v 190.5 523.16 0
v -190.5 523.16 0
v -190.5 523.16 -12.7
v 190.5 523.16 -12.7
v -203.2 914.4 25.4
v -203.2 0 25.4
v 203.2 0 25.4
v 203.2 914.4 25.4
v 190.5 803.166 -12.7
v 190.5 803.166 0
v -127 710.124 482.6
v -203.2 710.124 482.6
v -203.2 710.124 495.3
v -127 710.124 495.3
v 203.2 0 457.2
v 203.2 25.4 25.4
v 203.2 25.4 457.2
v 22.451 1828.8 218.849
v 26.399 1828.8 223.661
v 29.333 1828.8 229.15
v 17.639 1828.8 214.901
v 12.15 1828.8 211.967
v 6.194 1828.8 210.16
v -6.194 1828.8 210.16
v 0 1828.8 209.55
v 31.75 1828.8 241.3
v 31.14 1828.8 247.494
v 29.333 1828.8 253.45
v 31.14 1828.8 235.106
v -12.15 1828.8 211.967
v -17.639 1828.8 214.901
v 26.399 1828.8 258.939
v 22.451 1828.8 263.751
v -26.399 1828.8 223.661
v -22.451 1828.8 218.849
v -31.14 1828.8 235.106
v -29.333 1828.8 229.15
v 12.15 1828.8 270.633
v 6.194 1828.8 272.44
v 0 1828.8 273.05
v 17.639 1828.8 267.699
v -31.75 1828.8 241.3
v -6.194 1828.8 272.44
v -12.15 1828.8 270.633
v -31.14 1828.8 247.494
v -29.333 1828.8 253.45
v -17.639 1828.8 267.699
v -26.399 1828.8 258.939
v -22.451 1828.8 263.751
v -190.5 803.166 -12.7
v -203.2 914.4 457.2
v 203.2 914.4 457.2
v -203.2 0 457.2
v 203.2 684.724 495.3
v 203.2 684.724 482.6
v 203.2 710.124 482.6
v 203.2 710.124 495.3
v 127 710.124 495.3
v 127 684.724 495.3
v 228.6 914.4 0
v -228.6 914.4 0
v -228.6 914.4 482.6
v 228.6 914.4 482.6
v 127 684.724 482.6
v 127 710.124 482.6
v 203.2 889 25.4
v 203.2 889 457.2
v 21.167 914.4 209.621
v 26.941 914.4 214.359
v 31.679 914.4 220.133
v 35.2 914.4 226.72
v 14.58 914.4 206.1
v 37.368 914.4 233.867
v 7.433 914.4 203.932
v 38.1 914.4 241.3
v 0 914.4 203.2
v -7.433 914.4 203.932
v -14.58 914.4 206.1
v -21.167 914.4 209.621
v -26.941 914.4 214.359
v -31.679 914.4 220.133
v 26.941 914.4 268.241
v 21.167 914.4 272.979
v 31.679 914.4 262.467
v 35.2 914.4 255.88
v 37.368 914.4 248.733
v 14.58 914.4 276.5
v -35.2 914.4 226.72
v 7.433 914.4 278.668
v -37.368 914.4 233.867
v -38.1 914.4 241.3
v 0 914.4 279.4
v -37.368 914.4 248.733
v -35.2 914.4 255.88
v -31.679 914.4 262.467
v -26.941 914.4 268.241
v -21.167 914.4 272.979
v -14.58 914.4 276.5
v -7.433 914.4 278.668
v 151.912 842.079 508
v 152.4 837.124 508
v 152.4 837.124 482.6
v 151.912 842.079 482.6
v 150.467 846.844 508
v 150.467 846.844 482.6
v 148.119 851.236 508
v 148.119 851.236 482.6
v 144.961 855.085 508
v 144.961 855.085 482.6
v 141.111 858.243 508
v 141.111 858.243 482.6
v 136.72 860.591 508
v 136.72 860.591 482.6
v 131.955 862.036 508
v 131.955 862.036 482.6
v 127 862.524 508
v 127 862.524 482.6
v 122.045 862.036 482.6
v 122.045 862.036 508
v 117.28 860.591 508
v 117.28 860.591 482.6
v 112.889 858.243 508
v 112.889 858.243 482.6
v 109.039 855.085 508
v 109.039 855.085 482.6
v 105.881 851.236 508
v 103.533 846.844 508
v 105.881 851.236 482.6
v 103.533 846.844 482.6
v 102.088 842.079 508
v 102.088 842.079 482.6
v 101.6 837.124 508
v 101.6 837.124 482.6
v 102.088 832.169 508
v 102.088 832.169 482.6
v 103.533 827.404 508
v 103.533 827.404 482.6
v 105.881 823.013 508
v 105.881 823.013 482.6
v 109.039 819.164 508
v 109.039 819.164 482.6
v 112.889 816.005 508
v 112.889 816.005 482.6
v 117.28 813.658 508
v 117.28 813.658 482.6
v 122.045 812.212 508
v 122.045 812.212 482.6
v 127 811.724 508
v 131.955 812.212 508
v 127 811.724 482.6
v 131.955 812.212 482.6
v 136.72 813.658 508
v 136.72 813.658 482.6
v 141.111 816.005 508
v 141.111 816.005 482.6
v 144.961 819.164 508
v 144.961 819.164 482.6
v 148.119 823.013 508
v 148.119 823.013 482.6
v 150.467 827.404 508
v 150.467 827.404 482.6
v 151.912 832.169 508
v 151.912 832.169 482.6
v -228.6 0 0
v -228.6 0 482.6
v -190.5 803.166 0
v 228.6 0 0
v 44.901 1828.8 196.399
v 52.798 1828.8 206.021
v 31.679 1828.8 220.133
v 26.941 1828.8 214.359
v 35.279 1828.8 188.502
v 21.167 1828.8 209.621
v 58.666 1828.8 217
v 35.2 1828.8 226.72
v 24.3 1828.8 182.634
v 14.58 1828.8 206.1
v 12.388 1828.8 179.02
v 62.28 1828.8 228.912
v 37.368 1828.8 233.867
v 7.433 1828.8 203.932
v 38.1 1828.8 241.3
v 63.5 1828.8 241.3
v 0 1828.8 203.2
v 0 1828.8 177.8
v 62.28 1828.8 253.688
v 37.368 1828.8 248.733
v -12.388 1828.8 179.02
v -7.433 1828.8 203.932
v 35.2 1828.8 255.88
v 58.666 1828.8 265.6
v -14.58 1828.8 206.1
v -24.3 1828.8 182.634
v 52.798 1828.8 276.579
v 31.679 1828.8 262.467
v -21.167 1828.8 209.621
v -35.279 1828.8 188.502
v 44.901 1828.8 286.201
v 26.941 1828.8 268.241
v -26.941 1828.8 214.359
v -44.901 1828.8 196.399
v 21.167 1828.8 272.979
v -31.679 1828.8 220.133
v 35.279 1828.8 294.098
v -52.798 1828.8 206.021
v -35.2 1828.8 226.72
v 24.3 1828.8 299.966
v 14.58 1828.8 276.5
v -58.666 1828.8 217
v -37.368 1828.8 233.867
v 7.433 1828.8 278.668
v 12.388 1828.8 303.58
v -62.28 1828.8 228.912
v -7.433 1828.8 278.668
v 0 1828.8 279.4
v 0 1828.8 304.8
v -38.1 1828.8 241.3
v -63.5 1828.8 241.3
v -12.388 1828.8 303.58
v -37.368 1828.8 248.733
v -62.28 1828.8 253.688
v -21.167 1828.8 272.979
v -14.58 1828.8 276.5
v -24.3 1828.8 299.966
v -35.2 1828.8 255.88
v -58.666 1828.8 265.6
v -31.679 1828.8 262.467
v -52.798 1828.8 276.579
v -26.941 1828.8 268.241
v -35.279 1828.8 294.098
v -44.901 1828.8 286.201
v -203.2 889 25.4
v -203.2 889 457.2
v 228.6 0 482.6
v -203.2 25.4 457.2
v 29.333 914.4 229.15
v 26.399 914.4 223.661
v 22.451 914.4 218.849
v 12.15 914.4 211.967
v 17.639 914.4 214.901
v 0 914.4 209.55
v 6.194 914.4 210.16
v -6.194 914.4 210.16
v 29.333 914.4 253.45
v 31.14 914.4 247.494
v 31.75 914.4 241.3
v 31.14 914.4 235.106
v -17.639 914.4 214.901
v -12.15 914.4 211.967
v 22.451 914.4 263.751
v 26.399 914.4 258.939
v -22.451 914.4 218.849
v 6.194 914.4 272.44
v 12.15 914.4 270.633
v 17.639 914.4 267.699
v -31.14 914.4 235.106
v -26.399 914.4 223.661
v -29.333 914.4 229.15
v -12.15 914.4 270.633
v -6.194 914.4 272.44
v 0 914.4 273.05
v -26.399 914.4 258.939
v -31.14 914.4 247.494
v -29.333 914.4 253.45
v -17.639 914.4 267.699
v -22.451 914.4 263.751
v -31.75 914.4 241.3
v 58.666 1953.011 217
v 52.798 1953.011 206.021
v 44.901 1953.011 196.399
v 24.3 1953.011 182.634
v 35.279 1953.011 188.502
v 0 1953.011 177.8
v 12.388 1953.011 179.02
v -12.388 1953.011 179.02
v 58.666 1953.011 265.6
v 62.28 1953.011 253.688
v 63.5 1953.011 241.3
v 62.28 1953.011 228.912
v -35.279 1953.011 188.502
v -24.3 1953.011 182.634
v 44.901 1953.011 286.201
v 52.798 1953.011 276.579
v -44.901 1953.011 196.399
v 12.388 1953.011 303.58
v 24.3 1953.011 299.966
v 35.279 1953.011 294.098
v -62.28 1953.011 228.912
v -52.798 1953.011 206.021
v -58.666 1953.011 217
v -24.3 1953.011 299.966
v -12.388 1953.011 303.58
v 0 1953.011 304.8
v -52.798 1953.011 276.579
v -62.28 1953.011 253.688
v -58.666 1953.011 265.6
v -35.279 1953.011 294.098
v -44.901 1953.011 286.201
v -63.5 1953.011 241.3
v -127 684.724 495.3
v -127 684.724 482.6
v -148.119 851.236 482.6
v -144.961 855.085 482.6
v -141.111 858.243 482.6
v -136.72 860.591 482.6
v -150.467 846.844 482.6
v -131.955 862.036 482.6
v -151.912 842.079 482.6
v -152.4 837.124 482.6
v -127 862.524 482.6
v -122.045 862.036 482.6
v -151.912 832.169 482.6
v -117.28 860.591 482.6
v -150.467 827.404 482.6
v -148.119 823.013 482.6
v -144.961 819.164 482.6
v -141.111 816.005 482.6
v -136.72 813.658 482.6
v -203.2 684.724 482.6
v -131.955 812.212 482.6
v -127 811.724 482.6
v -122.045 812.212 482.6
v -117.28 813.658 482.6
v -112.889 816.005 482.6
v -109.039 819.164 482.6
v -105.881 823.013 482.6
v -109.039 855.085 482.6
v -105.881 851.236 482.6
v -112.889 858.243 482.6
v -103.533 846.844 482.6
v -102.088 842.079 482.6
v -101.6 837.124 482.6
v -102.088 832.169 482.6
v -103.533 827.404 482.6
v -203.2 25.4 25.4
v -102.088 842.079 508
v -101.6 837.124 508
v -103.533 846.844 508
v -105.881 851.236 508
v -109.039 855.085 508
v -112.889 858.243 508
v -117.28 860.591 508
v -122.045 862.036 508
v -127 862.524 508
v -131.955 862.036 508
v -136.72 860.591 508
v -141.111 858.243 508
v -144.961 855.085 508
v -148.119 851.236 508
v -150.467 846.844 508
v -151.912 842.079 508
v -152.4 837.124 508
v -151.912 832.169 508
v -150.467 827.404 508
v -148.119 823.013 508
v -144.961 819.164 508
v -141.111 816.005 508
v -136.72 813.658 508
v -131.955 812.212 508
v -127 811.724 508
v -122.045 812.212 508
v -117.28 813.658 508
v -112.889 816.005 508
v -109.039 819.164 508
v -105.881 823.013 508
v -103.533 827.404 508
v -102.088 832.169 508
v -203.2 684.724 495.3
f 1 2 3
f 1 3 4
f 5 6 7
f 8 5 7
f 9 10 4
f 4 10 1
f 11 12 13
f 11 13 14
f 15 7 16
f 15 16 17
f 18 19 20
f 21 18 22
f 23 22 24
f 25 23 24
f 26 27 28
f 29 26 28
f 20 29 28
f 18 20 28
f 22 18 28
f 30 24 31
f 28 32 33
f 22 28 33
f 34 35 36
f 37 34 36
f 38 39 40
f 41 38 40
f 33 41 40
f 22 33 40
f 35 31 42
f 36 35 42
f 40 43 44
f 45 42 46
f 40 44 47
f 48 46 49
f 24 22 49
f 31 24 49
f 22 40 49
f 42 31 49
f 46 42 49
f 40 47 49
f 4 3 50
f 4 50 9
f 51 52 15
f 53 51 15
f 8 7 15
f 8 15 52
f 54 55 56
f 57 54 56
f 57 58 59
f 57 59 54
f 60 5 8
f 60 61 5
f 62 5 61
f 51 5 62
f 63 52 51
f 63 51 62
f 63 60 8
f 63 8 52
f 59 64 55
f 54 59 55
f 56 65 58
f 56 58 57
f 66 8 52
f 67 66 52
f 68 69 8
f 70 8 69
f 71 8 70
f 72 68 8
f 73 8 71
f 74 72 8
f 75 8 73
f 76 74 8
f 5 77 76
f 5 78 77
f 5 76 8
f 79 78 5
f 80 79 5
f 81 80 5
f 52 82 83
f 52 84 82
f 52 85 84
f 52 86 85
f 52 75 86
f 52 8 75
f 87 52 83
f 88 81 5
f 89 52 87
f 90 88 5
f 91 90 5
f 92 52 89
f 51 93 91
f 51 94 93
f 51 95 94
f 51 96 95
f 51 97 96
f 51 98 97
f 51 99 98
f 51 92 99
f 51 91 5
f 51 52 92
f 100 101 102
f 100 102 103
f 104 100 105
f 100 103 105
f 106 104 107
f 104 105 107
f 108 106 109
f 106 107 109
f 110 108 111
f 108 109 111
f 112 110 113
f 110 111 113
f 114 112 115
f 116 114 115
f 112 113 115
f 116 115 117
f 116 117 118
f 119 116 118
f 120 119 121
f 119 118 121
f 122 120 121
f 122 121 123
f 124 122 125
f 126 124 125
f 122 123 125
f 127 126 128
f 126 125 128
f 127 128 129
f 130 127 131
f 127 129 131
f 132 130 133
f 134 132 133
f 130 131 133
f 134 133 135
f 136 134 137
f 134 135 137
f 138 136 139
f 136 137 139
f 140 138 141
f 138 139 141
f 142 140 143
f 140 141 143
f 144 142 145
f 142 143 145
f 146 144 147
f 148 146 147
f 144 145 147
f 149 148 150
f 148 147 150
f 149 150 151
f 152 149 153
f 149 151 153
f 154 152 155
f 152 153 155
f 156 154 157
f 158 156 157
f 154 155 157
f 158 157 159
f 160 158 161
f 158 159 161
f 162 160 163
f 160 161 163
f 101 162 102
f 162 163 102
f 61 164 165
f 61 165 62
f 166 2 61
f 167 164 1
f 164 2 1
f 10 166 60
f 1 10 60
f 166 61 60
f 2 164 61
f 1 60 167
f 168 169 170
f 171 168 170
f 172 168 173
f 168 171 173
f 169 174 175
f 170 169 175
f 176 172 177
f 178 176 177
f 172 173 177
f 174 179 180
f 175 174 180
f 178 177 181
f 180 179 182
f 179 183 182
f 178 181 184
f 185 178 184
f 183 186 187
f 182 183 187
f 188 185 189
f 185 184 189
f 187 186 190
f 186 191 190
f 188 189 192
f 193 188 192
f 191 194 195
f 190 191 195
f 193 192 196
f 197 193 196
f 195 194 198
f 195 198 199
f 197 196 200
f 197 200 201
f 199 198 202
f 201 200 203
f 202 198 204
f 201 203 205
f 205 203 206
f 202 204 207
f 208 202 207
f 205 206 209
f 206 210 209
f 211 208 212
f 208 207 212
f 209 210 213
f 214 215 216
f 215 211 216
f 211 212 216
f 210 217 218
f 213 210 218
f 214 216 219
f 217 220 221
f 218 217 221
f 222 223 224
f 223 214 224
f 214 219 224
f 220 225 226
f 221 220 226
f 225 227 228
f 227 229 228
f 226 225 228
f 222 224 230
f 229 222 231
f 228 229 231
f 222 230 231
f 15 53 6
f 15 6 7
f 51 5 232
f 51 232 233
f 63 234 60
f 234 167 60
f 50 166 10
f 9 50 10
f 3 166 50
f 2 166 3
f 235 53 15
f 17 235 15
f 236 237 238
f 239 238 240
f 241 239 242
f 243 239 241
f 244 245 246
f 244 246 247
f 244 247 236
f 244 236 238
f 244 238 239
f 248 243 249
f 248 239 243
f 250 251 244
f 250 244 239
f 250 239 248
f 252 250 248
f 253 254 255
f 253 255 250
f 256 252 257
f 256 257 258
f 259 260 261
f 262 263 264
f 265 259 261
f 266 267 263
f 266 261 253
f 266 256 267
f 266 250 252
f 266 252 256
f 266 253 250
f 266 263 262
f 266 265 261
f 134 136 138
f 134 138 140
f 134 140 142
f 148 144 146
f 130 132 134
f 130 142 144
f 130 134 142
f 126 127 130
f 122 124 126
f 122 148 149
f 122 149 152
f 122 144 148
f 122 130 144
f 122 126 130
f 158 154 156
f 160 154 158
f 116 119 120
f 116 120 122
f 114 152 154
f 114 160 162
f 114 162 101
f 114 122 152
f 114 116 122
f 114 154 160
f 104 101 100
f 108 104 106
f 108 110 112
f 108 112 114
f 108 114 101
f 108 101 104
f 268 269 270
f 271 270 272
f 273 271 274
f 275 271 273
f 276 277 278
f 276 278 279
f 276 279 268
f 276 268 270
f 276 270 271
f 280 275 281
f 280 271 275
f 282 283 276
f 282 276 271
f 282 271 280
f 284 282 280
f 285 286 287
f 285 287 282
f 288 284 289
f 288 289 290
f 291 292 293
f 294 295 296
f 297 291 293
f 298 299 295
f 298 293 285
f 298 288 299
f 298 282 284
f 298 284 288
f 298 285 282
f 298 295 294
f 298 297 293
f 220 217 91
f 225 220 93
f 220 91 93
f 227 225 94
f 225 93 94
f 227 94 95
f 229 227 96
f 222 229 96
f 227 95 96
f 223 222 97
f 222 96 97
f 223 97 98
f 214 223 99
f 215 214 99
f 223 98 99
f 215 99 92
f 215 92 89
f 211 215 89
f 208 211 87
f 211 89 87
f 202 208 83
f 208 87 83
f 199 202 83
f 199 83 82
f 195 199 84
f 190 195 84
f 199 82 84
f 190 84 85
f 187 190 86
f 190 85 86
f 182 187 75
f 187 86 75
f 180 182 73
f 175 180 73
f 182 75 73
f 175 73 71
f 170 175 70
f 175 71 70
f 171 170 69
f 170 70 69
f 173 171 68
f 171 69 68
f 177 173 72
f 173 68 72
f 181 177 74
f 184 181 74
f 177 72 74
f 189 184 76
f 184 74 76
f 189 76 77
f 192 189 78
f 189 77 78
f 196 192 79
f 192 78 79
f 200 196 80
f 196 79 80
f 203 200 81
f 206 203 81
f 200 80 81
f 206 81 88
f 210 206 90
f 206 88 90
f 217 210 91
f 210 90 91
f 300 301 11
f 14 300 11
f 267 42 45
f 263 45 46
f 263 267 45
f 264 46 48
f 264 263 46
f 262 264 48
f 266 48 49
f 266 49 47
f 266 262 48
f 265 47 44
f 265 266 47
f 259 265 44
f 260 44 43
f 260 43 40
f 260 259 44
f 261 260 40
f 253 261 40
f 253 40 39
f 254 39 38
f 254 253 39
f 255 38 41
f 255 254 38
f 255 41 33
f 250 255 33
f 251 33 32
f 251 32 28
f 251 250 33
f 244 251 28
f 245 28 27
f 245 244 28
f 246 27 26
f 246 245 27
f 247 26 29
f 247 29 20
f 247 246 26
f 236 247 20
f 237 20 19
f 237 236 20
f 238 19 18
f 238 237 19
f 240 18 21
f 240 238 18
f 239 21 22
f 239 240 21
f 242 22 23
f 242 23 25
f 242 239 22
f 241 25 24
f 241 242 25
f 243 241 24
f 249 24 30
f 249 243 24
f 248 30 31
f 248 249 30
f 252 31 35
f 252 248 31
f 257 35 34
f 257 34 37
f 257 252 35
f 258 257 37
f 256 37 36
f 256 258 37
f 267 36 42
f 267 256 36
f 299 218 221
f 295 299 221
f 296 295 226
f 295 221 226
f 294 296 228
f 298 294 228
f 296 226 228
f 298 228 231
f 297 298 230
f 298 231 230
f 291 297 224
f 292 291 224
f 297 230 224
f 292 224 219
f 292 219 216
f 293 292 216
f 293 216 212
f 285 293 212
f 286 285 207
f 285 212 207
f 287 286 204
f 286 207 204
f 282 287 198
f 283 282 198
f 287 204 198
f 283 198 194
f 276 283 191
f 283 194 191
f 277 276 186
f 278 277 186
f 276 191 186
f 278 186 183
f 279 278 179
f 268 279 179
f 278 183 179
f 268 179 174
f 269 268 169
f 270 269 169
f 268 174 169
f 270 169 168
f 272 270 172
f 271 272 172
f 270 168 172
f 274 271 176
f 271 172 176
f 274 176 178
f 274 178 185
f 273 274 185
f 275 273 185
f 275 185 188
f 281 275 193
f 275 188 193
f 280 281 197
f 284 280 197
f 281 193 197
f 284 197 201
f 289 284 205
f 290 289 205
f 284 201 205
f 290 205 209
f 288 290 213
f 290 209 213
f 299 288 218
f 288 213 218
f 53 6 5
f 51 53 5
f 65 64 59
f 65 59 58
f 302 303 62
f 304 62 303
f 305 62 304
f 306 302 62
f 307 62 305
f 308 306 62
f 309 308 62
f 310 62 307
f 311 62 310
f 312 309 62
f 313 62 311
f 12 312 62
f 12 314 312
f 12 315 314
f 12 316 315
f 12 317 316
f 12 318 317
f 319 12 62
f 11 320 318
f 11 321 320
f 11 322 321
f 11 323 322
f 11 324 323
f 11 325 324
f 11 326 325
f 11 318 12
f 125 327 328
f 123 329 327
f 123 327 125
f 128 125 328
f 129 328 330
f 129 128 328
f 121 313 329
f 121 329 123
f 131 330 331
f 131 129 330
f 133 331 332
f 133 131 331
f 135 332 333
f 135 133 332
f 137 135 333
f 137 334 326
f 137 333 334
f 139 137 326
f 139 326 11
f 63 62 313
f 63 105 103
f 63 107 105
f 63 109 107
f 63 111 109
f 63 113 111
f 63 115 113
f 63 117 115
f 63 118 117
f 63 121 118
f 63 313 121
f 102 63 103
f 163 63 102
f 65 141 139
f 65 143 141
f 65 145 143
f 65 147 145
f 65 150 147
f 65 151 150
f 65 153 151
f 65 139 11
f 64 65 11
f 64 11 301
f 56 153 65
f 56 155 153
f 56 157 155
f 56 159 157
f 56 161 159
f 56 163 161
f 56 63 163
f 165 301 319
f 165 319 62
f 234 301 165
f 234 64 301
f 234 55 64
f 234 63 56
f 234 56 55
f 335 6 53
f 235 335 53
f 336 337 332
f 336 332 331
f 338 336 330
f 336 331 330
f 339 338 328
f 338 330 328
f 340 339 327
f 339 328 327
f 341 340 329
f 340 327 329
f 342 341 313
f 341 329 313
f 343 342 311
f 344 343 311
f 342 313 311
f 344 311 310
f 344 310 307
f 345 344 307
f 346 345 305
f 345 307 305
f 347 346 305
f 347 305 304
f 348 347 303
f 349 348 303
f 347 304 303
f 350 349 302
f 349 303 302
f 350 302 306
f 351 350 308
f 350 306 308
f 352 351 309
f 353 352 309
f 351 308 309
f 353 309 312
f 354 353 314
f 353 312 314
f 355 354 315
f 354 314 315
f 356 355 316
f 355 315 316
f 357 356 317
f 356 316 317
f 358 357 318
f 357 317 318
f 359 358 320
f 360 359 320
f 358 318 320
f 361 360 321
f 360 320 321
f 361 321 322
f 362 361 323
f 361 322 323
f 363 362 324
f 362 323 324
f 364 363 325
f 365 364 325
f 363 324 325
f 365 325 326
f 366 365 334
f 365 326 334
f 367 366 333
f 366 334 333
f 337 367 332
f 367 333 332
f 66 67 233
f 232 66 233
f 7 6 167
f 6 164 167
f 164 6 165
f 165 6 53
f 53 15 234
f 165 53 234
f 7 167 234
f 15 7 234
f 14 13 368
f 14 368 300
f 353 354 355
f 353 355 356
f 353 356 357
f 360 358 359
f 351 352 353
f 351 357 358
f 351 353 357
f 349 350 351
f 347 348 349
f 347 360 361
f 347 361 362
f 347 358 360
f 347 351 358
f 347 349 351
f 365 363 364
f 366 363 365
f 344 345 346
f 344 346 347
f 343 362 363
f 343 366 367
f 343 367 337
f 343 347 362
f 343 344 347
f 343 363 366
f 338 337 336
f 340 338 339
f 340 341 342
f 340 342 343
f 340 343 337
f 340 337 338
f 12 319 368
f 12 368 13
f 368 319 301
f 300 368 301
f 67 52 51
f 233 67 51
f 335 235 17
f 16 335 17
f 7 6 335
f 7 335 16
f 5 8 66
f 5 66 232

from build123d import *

# Parameters (mm, degrees)
F0_W      = 457.2
F0_H      = 914.4
F1_DEPTH  = 25.4
F2_W      = 25.4
F2_H      = 914.4
F3_DEPTH  = 457.2
F4_W      = 25.4
F4_H      = 914.4
F5_DEPTH  = 457.2
F6_W      = 914.4
F6_H      = 25.4
F7_DEPTH  = 431.8
F8_W      = 406.4
F8_H      = 431.8
F9_DEPTH  = 25.4
F10_W     = 406.4
F10_H     = 431.8
F11_DEPTH = 25.4
F12_R     = 25.4
F13_DEPTH = 25.4
F12_W     = 76.2
F12_H     = 25.4
F14_DEPTH = 12.7
F15_W     = 381
F15_H     = 280.0061702728
F16_DEPTH = 12.7
F17_R     = 38.1
F17_R_2   = 31.75
F18_DEPTH = 914.4
F19_R     = 63.5
F19_R_2   = 38.1
F19_R_3   = 31.75
F20_DEPTH = 124.21073


with BuildPart() as f1:
    # F0 (on Top) → F1 (new body)
    with BuildSketch(Plane.XY):
        with Locations((0, 457.2)):
            Rectangle(F0_W, F0_H)
    extrude(amount=F1_DEPTH)

    # F2 (on face) → F3 (join)
    with BuildSketch(Plane.XY.offset(25.4)):
        with Locations((-215.9, 457.2)):
            Rectangle(F2_W, F2_H)
    extrude(amount=F3_DEPTH)

    # F4 (on face) → F5 (join)
    with BuildSketch(Plane.XY.offset(25.4)):
        with Locations((215.9, 457.2)):
            Rectangle(F4_W, F4_H)
    extrude(amount=F5_DEPTH)

    # F6 (on face) → F7 (join)
    with BuildSketch(Plane(origin=(203.2, 0, 0), x_dir=(0, -1, 0), z_dir=(-1, 0, 0))):
        with Locations((-457.2, 469.9)):
            Rectangle(F6_W, F6_H)
    extrude(amount=F7_DEPTH)

    # F12 (on face) → F13 (join)
    with BuildSketch(Plane.XY.offset(482.6)):
        with Locations((127, 837.1241350174)):
            Circle(F12_R)
        with Locations((-127, 837.1241350174)):
            Circle(F12_R)
    extrude(amount=F13_DEPTH)

    # F12 (on face) → F14 (join)
    with BuildSketch(Plane.XY.offset(482.6)):
        with Locations((-165.1, 697.4241350174)):
            Rectangle(F12_W, F12_H)
        with Locations((165.1, 697.4241350174)):
            Rectangle(F12_W, F12_H)
    extrude(amount=F14_DEPTH)

    # F15 (on face) → F16 (join)
    with BuildSketch(Plane(origin=(0, 0, 0), x_dir=(1, 0, 0), z_dir=(0, 0, -1))):
        with Locations((0, -663.1627082825)):
            Rectangle(F15_W, F15_H)
    extrude(amount=F16_DEPTH)


with BuildPart() as f9:
    # F8 (on face) → F9 (new body)
    with BuildSketch(Plane.XZ):
        with Locations((0, 241.3)):
            Rectangle(F8_W, F8_H)
    extrude(amount=-F9_DEPTH)


with BuildPart() as f11:
    # F10 (on face) → F11 (new body)
    with BuildSketch(Plane(origin=(0, 914.4, 0), x_dir=(-1, 0, 0), z_dir=(0, 1, 0))):
        with Locations((0, 241.3)):
            Rectangle(F10_W, F10_H)
    extrude(amount=-F11_DEPTH)

    # F17 (on face) → F18 (join)
    with BuildSketch(Plane(origin=(0, 914.4, 0), x_dir=(-1, 0, 0), z_dir=(0, 1, 0))):
        with Locations((0, 241.3)):
            Circle(F17_R)
        with Locations((0, 241.3)):
            Circle(F17_R_2, mode=Mode.SUBTRACT)
    extrude(amount=F18_DEPTH)

    # F19 (on face) → F20 (join)
    with BuildSketch(Plane(origin=(0, 1828.8, 0), x_dir=(-1, 0, 0), z_dir=(0, 1, 0))):
        with Locations((0, 241.3)):
            Circle(F19_R)
        with Locations((0, 241.3)):
            Circle(F19_R_2, mode=Mode.SUBTRACT)
        with Locations((0, 241.3)):
            Circle(F19_R_2)
        with Locations((0, 241.3)):
            Circle(F19_R_3, mode=Mode.SUBTRACT)
        with Locations((0, 241.3)):
            Circle(F19_R_3)
    extrude(amount=F20_DEPTH)


solid = Compound([f1.part, f9.part, f11.part])
